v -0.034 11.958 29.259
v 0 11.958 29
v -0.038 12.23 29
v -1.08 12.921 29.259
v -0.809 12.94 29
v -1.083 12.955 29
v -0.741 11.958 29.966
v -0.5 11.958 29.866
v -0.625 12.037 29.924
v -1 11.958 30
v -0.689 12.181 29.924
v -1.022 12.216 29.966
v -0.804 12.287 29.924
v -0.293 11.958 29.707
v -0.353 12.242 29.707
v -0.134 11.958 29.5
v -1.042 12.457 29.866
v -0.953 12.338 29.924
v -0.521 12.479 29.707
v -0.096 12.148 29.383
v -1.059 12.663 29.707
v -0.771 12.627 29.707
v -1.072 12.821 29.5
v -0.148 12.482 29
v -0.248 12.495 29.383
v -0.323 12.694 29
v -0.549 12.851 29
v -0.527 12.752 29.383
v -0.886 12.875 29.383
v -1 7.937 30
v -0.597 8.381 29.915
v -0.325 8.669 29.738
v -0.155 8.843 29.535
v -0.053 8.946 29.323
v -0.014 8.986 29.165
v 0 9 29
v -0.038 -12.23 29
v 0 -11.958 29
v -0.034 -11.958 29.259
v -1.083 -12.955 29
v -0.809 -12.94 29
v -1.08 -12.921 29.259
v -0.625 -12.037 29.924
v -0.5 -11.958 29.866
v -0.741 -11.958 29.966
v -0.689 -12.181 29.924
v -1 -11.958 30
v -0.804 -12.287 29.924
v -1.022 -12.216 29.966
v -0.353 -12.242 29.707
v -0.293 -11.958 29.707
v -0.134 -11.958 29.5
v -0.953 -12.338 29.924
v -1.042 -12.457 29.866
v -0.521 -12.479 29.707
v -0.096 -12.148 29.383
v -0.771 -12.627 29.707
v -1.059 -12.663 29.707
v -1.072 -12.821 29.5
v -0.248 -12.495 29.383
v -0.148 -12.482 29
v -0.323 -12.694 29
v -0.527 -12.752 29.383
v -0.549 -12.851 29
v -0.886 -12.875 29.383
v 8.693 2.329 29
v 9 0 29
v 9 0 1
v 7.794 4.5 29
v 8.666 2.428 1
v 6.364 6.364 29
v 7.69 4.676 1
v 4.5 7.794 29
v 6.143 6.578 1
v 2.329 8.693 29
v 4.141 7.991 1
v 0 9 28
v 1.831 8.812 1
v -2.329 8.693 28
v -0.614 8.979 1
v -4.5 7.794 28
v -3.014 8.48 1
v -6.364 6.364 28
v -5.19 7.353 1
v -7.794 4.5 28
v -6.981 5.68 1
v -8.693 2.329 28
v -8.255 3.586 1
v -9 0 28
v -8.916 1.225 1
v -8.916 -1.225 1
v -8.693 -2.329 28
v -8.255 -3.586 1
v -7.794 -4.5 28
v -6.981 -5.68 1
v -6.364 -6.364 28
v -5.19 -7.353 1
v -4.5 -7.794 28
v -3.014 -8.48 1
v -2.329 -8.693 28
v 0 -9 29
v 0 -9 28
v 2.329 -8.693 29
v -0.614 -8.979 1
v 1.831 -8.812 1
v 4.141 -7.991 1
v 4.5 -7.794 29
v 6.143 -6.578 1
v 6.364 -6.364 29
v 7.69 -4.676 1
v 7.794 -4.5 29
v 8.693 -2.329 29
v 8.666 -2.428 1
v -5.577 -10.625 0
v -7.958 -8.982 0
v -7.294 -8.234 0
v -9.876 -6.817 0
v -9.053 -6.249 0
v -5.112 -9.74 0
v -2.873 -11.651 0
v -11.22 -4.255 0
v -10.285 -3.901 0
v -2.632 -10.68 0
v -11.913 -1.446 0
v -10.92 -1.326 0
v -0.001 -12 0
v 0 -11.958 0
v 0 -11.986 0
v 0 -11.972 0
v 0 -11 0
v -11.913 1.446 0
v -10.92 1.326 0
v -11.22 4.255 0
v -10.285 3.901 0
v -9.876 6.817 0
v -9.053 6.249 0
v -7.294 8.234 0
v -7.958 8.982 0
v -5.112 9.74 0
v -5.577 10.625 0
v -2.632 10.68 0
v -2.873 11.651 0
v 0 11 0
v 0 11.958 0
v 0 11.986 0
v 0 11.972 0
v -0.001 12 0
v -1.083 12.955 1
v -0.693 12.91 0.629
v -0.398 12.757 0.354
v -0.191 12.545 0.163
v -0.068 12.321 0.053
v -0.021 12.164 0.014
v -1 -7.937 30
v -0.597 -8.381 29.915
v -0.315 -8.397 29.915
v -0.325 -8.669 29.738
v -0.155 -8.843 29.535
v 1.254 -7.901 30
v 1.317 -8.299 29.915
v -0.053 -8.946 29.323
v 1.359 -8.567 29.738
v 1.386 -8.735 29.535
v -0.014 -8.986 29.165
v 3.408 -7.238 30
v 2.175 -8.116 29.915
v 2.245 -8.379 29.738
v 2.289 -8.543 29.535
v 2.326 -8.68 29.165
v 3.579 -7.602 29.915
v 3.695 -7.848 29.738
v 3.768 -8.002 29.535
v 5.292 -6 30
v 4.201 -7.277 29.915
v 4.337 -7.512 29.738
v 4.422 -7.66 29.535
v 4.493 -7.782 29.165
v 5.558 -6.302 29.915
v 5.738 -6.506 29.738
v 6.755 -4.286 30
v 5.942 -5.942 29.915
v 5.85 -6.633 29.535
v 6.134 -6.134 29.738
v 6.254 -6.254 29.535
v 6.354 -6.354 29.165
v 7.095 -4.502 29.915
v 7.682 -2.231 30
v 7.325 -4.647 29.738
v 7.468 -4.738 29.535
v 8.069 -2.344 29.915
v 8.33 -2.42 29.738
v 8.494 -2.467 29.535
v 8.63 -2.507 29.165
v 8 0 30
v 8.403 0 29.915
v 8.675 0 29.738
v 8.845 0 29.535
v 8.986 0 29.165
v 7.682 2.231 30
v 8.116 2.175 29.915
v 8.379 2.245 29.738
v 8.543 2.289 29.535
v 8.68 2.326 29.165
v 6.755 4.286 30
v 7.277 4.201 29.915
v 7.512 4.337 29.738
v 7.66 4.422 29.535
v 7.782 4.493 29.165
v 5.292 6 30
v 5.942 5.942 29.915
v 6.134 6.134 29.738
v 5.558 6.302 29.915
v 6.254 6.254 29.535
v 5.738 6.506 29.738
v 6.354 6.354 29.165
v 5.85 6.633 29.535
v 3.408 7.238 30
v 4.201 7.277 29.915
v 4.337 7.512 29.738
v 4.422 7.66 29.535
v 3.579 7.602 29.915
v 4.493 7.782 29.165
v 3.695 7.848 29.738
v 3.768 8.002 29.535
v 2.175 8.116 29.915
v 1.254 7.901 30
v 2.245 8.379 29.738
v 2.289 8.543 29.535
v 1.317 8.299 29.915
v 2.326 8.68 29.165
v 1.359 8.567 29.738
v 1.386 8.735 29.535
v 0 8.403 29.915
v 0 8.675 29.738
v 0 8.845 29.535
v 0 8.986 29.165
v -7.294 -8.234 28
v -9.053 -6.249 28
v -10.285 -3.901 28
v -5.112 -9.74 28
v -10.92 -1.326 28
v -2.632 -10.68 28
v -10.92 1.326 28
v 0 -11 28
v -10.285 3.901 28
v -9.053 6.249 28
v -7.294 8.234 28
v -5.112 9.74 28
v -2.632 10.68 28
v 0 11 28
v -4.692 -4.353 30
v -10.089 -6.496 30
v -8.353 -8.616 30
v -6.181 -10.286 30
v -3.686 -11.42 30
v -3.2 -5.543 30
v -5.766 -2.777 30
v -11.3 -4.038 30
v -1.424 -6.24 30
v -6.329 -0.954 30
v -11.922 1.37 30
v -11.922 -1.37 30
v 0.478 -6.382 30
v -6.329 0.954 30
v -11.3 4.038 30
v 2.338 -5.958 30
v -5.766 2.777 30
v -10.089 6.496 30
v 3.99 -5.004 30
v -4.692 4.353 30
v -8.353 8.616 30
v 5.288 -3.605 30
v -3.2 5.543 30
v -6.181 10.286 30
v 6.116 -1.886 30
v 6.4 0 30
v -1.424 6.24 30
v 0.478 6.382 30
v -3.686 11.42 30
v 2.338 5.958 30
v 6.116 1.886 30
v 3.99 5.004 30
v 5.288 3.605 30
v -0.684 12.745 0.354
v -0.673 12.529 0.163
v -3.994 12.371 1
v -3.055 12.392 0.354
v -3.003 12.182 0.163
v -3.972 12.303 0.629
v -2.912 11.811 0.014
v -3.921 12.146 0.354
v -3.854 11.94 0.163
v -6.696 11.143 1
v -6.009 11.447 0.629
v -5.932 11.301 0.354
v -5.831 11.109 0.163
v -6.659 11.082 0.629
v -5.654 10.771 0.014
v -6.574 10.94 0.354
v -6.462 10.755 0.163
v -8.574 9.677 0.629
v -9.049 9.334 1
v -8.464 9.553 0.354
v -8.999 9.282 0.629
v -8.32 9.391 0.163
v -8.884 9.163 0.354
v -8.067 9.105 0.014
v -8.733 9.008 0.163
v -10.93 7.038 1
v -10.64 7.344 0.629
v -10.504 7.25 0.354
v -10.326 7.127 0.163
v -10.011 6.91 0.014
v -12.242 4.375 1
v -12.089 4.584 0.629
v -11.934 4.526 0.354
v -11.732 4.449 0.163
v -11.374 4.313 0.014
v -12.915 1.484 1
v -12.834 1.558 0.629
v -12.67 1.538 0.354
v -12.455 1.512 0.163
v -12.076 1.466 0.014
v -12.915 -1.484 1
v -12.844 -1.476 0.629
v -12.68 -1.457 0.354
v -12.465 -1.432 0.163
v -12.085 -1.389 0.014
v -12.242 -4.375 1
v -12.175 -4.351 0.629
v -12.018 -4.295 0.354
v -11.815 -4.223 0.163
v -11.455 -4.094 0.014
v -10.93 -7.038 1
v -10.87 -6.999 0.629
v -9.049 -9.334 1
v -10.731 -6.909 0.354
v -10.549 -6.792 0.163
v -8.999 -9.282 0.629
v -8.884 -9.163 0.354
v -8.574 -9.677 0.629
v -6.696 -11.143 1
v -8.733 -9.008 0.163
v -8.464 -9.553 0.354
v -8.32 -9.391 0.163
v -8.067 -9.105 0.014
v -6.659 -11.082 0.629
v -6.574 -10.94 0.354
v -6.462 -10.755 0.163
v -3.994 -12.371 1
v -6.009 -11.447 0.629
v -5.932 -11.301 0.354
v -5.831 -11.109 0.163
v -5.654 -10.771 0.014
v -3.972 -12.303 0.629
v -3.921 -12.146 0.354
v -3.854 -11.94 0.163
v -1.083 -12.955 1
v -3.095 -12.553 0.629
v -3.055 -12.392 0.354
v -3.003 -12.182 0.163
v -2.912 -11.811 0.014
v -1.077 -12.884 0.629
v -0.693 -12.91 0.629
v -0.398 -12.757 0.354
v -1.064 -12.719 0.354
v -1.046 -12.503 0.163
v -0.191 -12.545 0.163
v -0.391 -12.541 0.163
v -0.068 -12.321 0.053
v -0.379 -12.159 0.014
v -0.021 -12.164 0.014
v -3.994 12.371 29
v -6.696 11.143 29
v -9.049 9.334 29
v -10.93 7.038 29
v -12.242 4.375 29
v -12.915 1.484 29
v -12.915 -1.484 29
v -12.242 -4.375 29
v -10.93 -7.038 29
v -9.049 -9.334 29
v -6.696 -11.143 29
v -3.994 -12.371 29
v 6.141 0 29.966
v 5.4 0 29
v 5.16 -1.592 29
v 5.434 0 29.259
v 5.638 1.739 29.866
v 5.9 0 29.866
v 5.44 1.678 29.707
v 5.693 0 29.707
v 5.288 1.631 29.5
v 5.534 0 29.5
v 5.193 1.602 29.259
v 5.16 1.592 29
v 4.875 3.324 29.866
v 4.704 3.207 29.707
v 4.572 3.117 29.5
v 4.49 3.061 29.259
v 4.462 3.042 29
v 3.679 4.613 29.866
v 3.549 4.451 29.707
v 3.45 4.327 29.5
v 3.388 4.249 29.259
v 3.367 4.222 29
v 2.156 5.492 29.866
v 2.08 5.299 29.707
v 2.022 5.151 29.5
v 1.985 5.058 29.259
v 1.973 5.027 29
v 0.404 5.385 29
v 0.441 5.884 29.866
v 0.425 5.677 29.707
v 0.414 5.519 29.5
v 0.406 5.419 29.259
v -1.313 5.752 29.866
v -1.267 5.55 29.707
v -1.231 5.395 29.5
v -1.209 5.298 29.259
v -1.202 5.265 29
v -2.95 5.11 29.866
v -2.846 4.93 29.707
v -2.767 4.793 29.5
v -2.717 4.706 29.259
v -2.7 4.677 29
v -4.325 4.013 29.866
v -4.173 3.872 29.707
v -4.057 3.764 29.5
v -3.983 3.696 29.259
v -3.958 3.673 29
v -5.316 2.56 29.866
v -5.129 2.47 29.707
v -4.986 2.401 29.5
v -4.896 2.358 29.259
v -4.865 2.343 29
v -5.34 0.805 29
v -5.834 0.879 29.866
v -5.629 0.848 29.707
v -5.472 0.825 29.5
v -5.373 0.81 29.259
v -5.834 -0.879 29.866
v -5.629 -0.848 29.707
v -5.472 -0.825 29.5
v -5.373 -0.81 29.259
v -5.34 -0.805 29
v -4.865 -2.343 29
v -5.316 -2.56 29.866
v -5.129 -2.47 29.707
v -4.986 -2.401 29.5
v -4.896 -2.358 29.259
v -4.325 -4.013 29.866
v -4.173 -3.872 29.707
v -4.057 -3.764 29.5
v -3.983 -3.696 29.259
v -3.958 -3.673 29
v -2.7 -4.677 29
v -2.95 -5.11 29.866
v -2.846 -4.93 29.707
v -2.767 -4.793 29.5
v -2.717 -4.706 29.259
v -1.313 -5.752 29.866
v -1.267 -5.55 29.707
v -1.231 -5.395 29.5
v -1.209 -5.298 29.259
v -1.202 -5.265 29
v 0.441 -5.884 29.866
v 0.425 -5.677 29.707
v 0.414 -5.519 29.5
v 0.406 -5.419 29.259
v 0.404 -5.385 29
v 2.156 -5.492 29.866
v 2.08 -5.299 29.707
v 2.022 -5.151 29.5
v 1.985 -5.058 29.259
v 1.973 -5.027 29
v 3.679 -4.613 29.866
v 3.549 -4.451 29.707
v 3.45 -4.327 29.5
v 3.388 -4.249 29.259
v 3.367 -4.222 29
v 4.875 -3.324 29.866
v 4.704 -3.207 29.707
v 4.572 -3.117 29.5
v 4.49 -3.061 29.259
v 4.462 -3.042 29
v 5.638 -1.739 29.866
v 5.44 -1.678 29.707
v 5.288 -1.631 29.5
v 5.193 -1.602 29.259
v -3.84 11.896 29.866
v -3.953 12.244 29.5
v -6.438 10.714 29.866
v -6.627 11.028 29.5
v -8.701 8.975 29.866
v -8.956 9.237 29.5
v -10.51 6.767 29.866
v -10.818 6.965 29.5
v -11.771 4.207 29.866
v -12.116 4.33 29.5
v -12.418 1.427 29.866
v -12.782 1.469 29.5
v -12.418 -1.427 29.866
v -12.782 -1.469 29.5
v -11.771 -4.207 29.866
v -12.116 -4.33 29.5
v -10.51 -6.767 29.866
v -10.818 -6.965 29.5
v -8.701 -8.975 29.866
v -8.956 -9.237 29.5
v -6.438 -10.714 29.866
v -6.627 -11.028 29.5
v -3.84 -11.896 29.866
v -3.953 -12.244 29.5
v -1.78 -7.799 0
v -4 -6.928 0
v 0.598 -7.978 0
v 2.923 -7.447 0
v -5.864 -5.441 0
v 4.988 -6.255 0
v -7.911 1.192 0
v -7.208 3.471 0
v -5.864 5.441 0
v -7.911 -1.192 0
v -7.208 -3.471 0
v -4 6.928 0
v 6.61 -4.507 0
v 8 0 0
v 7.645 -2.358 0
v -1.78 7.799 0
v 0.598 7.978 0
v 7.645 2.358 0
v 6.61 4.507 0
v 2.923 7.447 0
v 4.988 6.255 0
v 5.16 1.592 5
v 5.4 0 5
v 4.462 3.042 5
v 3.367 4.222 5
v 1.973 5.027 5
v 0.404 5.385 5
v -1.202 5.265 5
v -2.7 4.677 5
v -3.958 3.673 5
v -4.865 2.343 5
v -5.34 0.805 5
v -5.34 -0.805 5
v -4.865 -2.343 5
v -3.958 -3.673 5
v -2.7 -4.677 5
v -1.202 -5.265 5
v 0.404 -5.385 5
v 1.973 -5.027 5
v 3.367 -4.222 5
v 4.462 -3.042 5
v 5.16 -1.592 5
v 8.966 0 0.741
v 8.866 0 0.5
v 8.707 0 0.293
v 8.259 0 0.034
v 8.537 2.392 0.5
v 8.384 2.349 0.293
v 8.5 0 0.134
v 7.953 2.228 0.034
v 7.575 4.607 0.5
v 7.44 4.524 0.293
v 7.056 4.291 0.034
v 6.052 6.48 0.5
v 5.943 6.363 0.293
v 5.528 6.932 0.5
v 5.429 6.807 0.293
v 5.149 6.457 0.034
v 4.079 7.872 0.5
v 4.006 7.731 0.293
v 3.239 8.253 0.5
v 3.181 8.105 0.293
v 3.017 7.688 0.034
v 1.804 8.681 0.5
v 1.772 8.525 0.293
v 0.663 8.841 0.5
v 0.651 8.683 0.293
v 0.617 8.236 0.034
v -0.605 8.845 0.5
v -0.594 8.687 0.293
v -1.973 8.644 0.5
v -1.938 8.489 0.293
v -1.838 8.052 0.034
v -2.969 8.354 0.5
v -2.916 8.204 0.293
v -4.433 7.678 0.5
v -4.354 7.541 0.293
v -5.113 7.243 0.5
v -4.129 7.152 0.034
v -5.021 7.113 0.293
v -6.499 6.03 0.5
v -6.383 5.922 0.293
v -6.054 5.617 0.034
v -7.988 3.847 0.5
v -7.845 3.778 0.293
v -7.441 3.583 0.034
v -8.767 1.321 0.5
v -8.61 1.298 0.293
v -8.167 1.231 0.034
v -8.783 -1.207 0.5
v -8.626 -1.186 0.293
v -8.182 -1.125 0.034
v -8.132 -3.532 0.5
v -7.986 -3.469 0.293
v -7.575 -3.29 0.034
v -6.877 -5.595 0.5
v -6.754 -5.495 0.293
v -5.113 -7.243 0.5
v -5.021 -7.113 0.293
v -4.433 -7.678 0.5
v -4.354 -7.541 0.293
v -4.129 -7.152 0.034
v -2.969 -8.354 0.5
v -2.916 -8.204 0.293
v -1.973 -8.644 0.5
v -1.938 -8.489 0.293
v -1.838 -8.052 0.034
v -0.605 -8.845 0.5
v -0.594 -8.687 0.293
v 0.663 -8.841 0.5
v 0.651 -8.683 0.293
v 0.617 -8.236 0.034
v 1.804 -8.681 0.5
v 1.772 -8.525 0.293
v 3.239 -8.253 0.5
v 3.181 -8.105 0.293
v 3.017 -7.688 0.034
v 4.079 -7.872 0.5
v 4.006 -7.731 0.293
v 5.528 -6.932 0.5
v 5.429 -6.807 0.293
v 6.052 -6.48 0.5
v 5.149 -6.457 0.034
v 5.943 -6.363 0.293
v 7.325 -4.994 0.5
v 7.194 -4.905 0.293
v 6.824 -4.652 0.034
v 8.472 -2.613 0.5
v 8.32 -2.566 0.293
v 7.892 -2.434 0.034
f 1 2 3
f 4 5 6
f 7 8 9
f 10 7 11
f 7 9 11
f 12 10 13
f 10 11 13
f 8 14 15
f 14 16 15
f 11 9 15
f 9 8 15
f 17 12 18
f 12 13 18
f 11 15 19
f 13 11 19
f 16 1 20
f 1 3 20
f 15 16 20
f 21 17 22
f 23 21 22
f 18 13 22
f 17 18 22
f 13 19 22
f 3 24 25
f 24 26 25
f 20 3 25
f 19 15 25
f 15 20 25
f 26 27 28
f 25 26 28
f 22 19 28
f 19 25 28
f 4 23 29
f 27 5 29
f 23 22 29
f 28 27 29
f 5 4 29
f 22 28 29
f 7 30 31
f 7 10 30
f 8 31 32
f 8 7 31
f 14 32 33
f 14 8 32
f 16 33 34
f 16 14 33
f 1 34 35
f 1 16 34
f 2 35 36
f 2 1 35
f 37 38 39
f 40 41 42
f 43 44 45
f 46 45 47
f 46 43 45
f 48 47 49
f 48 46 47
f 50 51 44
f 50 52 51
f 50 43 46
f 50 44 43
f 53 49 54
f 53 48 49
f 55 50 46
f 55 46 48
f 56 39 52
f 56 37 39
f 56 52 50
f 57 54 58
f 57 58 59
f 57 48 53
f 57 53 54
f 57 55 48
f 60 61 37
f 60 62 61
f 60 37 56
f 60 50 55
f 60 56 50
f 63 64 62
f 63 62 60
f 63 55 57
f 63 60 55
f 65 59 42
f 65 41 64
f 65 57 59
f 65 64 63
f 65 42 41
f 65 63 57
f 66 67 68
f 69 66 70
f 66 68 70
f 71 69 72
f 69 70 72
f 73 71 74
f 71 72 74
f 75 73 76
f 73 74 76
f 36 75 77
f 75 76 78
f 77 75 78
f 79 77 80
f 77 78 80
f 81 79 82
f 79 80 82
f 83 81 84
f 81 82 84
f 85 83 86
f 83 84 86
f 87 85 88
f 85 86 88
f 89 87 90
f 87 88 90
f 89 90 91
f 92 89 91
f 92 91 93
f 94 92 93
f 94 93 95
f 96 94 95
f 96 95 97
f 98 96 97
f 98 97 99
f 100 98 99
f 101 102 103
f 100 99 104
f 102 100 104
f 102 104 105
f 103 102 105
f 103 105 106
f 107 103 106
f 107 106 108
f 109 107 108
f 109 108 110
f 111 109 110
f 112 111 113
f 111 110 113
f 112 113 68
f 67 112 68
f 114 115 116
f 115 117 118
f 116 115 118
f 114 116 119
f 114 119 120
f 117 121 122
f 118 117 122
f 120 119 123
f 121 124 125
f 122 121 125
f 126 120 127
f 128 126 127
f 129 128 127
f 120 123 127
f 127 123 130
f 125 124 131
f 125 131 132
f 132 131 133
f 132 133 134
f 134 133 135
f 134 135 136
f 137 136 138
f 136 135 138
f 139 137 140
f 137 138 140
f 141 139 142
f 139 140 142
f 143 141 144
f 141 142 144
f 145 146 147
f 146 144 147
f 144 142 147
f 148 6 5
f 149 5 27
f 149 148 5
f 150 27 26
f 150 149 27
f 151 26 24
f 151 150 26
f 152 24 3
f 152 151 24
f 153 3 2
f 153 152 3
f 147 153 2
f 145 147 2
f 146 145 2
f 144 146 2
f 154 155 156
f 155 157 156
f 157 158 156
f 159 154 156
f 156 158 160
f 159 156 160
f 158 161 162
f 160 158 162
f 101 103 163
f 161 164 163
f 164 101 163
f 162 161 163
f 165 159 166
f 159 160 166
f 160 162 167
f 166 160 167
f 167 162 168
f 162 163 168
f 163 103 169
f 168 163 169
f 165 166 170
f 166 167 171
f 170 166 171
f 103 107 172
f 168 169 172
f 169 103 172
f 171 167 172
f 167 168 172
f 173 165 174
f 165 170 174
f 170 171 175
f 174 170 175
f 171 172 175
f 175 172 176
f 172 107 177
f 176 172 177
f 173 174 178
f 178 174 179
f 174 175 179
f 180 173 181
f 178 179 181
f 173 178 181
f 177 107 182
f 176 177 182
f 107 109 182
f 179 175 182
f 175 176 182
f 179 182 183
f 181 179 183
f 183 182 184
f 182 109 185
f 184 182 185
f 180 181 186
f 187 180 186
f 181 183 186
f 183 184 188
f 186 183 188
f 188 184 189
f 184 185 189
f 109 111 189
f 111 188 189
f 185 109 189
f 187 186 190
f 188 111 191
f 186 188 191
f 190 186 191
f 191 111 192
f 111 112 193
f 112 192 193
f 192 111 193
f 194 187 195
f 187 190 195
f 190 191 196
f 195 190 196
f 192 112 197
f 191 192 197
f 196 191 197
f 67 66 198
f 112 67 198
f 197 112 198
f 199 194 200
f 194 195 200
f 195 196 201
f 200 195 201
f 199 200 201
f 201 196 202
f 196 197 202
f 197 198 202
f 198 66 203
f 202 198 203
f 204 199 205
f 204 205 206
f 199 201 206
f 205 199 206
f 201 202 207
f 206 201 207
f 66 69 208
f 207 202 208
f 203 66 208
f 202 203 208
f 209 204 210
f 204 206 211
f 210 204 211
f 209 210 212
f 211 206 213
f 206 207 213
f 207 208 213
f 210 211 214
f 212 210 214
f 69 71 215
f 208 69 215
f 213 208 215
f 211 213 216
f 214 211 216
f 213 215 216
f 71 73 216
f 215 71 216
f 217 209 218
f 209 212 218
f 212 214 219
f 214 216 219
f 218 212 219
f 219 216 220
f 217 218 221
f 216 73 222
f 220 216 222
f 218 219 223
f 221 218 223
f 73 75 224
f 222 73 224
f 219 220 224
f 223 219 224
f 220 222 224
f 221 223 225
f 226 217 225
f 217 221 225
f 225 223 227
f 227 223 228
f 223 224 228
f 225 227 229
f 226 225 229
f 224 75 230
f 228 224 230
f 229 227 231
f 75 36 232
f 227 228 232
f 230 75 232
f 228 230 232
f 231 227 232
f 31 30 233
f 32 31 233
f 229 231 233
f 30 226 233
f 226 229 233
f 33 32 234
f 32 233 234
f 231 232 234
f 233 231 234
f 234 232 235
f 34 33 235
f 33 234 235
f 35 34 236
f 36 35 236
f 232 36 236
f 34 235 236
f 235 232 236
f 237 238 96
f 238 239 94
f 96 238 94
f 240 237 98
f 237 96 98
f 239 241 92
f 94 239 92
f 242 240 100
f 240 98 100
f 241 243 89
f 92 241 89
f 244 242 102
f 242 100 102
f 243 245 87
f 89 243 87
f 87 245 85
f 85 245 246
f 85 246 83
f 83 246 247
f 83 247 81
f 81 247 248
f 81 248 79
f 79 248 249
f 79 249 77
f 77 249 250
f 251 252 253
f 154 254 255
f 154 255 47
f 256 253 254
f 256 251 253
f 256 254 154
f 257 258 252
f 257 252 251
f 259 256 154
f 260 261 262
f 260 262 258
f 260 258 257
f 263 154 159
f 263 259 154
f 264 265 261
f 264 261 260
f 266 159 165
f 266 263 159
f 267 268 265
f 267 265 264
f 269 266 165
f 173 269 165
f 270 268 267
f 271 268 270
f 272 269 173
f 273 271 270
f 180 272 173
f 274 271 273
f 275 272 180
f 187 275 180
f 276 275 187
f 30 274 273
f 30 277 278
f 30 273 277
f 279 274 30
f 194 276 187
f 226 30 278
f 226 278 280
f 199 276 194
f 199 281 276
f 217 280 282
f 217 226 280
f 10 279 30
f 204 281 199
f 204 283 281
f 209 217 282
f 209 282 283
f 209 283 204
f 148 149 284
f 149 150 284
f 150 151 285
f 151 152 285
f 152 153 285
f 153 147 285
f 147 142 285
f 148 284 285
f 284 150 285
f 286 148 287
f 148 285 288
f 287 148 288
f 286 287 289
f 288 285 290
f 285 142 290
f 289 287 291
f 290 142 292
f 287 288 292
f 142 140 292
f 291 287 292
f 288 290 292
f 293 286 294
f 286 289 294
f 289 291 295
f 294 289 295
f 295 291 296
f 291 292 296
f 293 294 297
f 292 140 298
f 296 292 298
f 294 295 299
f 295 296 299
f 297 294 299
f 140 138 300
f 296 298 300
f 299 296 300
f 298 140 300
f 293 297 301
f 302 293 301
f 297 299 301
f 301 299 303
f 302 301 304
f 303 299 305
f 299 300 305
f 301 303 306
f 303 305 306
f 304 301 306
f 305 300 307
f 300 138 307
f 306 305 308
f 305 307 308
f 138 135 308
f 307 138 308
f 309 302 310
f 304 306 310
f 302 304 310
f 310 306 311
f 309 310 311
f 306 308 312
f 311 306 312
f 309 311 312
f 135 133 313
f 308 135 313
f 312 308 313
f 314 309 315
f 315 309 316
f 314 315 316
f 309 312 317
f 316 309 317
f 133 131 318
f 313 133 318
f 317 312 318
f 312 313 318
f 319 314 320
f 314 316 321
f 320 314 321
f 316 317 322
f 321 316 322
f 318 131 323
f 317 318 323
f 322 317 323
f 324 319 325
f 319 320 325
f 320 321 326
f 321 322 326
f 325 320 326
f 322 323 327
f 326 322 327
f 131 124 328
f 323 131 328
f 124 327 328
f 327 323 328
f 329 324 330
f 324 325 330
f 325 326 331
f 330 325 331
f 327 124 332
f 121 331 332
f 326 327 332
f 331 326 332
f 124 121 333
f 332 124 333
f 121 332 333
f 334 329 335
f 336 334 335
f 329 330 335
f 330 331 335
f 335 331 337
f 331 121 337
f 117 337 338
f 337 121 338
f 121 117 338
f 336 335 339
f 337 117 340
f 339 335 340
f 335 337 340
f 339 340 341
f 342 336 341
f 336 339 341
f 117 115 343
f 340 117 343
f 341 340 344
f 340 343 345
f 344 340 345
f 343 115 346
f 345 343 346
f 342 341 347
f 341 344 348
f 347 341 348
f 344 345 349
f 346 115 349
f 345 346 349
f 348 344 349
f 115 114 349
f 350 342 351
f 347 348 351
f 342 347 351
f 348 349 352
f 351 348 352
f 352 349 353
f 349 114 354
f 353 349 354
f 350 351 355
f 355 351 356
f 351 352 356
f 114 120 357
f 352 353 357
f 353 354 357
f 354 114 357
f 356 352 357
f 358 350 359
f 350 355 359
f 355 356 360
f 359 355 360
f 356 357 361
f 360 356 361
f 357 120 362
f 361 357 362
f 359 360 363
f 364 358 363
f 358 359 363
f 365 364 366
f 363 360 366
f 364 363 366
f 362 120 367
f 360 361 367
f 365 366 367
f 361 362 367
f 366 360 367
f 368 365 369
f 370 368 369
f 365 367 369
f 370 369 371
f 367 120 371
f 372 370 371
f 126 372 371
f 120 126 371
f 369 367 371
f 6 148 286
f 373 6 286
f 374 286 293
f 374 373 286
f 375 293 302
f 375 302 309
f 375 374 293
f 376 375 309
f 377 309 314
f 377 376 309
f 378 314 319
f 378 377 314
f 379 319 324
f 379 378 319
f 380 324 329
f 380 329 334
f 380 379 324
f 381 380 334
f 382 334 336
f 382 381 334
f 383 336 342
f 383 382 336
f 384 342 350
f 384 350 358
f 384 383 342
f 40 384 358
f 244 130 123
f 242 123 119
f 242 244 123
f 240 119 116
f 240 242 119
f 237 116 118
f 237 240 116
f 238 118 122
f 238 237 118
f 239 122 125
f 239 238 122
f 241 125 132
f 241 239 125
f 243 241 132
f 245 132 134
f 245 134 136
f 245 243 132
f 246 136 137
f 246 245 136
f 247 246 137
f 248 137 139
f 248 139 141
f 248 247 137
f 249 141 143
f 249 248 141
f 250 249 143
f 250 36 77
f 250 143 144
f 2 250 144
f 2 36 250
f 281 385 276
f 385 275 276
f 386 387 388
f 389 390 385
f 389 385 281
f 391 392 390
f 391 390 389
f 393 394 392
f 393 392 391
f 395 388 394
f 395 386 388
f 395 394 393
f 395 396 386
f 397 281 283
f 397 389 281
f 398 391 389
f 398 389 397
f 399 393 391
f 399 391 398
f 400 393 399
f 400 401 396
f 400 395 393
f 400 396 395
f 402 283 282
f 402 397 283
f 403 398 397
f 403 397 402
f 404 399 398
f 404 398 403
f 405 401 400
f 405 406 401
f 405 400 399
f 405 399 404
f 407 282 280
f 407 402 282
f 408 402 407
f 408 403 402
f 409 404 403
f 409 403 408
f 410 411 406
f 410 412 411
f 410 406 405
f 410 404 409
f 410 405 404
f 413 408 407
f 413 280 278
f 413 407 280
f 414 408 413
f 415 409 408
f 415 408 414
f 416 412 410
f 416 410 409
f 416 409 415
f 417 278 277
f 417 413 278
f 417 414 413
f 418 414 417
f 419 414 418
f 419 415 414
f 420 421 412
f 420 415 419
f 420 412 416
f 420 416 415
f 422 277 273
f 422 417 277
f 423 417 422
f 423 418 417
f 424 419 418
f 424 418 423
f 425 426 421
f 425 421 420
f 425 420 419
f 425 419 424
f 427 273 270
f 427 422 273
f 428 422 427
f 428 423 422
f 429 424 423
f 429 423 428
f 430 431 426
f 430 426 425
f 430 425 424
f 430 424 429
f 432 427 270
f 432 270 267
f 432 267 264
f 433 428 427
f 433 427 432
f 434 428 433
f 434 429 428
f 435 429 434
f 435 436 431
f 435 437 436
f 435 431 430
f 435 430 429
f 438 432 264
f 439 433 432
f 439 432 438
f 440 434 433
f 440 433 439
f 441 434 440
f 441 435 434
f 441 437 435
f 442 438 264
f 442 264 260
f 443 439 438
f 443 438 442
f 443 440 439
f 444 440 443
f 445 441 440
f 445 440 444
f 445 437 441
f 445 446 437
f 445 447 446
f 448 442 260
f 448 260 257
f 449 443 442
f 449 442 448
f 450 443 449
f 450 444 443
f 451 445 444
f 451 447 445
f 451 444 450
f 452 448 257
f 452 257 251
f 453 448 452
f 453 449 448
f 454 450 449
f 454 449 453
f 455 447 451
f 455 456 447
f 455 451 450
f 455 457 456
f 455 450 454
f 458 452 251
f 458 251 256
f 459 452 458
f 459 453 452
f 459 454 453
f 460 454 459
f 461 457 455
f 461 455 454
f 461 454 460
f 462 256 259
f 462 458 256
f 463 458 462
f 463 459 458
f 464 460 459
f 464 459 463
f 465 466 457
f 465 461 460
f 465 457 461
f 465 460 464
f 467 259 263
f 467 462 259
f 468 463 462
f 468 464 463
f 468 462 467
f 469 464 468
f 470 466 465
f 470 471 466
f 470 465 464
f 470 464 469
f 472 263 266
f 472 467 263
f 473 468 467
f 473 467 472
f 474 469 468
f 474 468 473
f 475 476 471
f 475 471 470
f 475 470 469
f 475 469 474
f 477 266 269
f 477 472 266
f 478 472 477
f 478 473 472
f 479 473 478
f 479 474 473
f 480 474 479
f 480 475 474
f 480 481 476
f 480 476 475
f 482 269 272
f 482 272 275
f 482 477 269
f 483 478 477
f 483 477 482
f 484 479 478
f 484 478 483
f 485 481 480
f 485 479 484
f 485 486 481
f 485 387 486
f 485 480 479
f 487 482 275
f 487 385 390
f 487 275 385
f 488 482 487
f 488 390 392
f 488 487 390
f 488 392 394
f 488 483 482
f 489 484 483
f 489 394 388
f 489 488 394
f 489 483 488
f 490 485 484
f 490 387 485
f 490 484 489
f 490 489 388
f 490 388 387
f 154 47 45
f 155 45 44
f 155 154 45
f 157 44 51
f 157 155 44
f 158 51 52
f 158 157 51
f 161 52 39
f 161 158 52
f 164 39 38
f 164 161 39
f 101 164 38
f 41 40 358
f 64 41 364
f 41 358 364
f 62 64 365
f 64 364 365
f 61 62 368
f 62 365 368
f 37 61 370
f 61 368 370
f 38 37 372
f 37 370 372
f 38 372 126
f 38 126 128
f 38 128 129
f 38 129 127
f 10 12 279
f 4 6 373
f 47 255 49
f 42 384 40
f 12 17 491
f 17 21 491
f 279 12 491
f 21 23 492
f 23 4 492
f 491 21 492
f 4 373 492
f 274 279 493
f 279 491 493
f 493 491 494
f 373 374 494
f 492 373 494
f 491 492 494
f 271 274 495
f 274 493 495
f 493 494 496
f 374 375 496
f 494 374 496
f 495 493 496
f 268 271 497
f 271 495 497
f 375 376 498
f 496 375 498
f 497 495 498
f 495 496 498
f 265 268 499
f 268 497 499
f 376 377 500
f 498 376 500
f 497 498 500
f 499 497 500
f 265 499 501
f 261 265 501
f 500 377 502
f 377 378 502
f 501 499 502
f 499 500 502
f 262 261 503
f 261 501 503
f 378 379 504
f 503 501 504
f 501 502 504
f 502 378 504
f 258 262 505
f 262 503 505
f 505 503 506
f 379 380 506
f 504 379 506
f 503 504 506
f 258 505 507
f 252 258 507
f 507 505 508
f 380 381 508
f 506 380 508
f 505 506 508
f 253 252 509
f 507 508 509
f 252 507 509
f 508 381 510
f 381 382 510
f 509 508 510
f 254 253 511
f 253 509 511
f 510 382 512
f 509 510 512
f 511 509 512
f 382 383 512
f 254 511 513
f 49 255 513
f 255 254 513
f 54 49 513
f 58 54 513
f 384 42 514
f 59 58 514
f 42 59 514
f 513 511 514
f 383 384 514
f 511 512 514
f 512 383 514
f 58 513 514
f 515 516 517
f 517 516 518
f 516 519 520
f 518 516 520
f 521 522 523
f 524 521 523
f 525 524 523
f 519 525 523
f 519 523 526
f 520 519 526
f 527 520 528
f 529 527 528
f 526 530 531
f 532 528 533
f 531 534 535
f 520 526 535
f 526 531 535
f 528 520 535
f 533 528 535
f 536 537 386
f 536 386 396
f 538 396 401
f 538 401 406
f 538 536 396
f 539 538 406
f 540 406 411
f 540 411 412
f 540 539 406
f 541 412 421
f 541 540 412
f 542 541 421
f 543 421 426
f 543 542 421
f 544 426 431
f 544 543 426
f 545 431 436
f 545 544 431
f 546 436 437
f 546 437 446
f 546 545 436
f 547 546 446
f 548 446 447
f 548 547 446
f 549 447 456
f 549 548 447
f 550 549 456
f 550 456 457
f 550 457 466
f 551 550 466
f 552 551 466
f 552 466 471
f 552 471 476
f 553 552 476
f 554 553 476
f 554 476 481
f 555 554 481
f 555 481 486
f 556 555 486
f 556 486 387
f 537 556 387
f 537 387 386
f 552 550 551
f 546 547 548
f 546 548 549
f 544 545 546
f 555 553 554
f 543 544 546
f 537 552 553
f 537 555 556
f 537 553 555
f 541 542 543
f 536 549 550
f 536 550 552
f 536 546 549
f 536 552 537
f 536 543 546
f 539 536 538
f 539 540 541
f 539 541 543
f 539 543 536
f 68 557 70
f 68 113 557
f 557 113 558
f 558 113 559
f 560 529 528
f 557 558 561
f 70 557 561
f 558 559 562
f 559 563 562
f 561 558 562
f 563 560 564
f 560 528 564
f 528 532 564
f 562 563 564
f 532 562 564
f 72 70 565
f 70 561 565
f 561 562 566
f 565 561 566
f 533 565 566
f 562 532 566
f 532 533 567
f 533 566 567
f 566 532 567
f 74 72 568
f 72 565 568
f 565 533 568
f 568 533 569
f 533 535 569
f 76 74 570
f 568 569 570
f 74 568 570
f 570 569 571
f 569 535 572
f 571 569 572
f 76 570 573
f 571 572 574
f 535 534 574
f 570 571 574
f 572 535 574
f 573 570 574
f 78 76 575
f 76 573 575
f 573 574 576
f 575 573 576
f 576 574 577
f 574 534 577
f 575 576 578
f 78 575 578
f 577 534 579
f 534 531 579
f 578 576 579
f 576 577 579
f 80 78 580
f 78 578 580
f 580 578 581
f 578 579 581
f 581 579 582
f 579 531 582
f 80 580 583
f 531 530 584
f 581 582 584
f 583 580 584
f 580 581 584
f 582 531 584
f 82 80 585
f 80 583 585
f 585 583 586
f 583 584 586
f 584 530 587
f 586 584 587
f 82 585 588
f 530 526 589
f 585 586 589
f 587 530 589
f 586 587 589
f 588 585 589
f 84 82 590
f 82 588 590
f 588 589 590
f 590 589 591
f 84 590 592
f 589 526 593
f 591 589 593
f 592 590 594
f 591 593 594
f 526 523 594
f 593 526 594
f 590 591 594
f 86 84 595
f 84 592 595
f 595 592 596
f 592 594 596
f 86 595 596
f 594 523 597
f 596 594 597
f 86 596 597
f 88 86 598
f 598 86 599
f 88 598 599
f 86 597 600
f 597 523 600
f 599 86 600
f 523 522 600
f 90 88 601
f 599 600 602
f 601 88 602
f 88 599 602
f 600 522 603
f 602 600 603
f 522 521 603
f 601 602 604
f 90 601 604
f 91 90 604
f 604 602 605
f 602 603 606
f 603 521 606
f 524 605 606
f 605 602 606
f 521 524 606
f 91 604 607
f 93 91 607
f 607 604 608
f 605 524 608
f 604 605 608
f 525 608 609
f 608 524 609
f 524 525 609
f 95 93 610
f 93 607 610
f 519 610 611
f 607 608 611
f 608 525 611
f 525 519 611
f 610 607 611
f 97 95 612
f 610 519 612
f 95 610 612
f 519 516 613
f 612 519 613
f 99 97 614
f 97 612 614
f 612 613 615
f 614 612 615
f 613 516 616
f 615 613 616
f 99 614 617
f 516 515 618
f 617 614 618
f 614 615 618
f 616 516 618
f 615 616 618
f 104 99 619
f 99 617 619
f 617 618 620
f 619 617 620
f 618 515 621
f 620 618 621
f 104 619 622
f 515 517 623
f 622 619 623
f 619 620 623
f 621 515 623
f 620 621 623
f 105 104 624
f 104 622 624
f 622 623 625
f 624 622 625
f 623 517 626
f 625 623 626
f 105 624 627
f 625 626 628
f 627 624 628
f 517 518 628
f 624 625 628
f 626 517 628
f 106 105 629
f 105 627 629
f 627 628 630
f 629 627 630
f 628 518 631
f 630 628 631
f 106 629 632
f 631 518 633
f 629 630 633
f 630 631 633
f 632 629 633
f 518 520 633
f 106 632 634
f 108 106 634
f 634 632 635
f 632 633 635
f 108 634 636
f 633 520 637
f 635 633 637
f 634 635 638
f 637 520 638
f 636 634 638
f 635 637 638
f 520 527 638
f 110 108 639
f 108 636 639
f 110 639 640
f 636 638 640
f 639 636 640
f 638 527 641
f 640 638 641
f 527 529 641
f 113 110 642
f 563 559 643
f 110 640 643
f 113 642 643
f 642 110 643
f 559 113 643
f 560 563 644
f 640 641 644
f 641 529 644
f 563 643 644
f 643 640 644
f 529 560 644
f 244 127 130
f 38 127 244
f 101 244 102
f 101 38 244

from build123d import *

# Parameters (mm, degrees)
F0_R     = 9
F0_R_2   = 5.4
F1_DEPTH = 30
F2_DEPTH = 5
F4_DEPTH = 2
F5_DEPTH = 30
F6_R     = 1


with BuildPart() as f1:
    # F0 (on Top) → F1 (new body)
    with BuildSketch(Plane.XY):
        Circle(F0_R)
        Circle(F0_R_2, mode=Mode.SUBTRACT)
    extrude(amount=F1_DEPTH)

    # F0 (on Top) → F2 (join)
    with BuildSketch(Plane.XY):
        Circle(F0_R_2)
    extrude(amount=F2_DEPTH)

    # F3 (on face) → F4 (join)
    with BuildSketch(Plane.XY.offset(30)):
        with BuildLine():
            Line((0, 11), (0, 13))
            ThreePointArc((0, 13), (-13, 0), (0, -13))
            Line((0, -13), (0, -11))
            ThreePointArc((0, -11), (-11, 0), (0, 11))
        make_face()
        with BuildLine():
            Line((0, 9), (0, 11))
            ThreePointArc((0, 11), (-11, 0), (0, -11))
            Line((0, -11), (0, -9))
            ThreePointArc((0, -9), (-9, 0), (0, 9))
        make_face()
    extrude(amount=-F4_DEPTH)

    # F3 (on face) → F5 (join)
    with BuildSketch(Plane.XY.offset(30)):
        with BuildLine():
            Line((0, 11), (0, 13))
            ThreePointArc((0, 13), (-13, 0), (0, -13))
            Line((0, -13), (0, -11))
            ThreePointArc((0, -11), (-11, 0), (0, 11))
        make_face()
    extrude(amount=-F5_DEPTH)

    # F6
    f6_edges = [f1.edges().sort_by_distance(p)[0] for p in [
        (-9, 0, 0),
        (-13, 0, 0),
        (-13, 0, 30),
        (0, 13, 15),
        (0, -13, 15),
        (0, -11, 30),
        (0, 11, 30),
        (6.363961, -6.363961, 30),
        (6.363961, 6.363961, 30),
        (-5.4, 0, 30),
    ]]
    fillet(f6_edges, radius=F6_R)


solid = f1.part
